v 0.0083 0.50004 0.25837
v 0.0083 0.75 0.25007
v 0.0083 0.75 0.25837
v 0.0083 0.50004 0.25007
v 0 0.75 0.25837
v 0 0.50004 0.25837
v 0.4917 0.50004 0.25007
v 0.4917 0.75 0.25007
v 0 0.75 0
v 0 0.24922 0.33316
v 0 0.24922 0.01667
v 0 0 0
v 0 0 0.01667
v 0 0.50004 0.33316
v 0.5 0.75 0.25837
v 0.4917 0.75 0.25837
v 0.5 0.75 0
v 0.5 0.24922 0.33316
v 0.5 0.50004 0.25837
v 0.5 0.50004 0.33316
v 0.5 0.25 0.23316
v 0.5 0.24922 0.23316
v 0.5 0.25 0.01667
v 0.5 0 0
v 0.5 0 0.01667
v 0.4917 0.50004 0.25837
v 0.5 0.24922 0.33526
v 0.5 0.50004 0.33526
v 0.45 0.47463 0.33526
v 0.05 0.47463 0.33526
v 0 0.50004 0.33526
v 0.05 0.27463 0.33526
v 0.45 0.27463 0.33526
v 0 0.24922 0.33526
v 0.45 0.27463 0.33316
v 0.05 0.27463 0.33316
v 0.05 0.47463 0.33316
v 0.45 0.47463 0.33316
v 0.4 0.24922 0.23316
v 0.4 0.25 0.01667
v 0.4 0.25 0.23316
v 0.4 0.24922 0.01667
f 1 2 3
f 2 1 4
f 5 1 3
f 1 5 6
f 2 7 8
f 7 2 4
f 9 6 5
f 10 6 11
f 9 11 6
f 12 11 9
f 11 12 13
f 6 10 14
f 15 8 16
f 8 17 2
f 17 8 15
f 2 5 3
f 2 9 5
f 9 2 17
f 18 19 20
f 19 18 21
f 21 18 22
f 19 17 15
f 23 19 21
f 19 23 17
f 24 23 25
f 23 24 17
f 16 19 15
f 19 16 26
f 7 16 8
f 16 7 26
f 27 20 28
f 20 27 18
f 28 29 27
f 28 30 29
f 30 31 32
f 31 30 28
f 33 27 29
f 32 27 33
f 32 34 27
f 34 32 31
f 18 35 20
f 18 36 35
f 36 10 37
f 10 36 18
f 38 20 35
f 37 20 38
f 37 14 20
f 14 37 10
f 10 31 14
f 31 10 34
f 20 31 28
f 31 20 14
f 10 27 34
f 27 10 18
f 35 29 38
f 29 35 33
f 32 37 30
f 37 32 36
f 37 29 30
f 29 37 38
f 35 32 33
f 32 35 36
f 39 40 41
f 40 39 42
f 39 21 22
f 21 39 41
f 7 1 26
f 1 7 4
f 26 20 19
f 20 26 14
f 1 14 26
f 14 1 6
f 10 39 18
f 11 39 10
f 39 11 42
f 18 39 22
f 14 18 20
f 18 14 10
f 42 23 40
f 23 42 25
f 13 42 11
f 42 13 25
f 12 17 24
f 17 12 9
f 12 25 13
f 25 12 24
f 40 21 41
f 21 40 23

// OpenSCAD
// Parameters
base_length = 0.5;
base_width = 0.75;
base_height = 0.016667;

upper_length = 0.5;
upper_width = 0.5;
upper_offset_front = 0.25;
upper_reach = 0.2334;

strip_width = 0.0083;
strip_length = 0.5;
strip_offset_front = 0.25;
strip_height = 0.0083;

trans_length = 0.5;
trans_width = 0.250819;
trans_offset_front = 0.24922;
trans_thickness = 0.0021;
trans_reach = 0.335265;

upper_pad_depth = 0.1;
deeper_depth = 0.2167;
deeper_x = 0.4;  // Assumed x-dimension of deeper continuation

hole_length = 0.4;  // Assumed hole dimensions in transverse feature
hole_width = 0.2;

$fn = 100;  // Smoothness for curved surfaces

// Base slab
module base() {
    cube([base_length, base_width, base_height]);
}

// Upper rectangular feature
module upper_feature() {
    translate([0, upper_offset_front, base_height])
        cube([upper_length, upper_width, upper_reach]);
}

// Edge strips
module edge_strips() {
    z_pos = base_height + upper_reach;
    // Left strip
    translate([0, upper_offset_front, z_pos])
        cube([strip_width, strip_length, strip_height]);
    // Right strip
    translate([base_length - strip_width, upper_offset_front, z_pos])
        cube([strip_width, strip_length, strip_height]);
}

// Transverse feature with hole
module transverse_feature() {
    z_pos = trans_reach - trans_thickness;
    hole_x = (trans_length - hole_length) / 2;
    hole_y = (trans_width - hole_width) / 2;
    translate([0, trans_offset_front, z_pos])
        difference() {
            cube([trans_length, trans_width, trans_thickness]);
            translate([hole_x, hole_y, -0.001])
                cube([hole_length, hole_width, trans_thickness + 0.002]);
        }
}

// Stepped portion: deeper continuation and upper pad
module stepped_portion() {
    // Deeper continuation (lower part)
    deeper_z_start = trans_reach - trans_thickness - upper_pad_depth - deeper_depth;
    translate([0, trans_offset_front, deeper_z_start])
        cube([deeper_x, trans_width, deeper_depth]);
    // Upper pad (shallow part)
    upper_pad_z_start = trans_reach - trans_thickness - upper_pad_depth;
    translate([0, trans_offset_front, upper_pad_z_start])
        cube([trans_length, trans_width, upper_pad_depth]);
}

// Main model: union of all parts
union() {
    base();
    upper_feature();
    edge_strips();
    transverse_feature();
    stepped_portion();
}
